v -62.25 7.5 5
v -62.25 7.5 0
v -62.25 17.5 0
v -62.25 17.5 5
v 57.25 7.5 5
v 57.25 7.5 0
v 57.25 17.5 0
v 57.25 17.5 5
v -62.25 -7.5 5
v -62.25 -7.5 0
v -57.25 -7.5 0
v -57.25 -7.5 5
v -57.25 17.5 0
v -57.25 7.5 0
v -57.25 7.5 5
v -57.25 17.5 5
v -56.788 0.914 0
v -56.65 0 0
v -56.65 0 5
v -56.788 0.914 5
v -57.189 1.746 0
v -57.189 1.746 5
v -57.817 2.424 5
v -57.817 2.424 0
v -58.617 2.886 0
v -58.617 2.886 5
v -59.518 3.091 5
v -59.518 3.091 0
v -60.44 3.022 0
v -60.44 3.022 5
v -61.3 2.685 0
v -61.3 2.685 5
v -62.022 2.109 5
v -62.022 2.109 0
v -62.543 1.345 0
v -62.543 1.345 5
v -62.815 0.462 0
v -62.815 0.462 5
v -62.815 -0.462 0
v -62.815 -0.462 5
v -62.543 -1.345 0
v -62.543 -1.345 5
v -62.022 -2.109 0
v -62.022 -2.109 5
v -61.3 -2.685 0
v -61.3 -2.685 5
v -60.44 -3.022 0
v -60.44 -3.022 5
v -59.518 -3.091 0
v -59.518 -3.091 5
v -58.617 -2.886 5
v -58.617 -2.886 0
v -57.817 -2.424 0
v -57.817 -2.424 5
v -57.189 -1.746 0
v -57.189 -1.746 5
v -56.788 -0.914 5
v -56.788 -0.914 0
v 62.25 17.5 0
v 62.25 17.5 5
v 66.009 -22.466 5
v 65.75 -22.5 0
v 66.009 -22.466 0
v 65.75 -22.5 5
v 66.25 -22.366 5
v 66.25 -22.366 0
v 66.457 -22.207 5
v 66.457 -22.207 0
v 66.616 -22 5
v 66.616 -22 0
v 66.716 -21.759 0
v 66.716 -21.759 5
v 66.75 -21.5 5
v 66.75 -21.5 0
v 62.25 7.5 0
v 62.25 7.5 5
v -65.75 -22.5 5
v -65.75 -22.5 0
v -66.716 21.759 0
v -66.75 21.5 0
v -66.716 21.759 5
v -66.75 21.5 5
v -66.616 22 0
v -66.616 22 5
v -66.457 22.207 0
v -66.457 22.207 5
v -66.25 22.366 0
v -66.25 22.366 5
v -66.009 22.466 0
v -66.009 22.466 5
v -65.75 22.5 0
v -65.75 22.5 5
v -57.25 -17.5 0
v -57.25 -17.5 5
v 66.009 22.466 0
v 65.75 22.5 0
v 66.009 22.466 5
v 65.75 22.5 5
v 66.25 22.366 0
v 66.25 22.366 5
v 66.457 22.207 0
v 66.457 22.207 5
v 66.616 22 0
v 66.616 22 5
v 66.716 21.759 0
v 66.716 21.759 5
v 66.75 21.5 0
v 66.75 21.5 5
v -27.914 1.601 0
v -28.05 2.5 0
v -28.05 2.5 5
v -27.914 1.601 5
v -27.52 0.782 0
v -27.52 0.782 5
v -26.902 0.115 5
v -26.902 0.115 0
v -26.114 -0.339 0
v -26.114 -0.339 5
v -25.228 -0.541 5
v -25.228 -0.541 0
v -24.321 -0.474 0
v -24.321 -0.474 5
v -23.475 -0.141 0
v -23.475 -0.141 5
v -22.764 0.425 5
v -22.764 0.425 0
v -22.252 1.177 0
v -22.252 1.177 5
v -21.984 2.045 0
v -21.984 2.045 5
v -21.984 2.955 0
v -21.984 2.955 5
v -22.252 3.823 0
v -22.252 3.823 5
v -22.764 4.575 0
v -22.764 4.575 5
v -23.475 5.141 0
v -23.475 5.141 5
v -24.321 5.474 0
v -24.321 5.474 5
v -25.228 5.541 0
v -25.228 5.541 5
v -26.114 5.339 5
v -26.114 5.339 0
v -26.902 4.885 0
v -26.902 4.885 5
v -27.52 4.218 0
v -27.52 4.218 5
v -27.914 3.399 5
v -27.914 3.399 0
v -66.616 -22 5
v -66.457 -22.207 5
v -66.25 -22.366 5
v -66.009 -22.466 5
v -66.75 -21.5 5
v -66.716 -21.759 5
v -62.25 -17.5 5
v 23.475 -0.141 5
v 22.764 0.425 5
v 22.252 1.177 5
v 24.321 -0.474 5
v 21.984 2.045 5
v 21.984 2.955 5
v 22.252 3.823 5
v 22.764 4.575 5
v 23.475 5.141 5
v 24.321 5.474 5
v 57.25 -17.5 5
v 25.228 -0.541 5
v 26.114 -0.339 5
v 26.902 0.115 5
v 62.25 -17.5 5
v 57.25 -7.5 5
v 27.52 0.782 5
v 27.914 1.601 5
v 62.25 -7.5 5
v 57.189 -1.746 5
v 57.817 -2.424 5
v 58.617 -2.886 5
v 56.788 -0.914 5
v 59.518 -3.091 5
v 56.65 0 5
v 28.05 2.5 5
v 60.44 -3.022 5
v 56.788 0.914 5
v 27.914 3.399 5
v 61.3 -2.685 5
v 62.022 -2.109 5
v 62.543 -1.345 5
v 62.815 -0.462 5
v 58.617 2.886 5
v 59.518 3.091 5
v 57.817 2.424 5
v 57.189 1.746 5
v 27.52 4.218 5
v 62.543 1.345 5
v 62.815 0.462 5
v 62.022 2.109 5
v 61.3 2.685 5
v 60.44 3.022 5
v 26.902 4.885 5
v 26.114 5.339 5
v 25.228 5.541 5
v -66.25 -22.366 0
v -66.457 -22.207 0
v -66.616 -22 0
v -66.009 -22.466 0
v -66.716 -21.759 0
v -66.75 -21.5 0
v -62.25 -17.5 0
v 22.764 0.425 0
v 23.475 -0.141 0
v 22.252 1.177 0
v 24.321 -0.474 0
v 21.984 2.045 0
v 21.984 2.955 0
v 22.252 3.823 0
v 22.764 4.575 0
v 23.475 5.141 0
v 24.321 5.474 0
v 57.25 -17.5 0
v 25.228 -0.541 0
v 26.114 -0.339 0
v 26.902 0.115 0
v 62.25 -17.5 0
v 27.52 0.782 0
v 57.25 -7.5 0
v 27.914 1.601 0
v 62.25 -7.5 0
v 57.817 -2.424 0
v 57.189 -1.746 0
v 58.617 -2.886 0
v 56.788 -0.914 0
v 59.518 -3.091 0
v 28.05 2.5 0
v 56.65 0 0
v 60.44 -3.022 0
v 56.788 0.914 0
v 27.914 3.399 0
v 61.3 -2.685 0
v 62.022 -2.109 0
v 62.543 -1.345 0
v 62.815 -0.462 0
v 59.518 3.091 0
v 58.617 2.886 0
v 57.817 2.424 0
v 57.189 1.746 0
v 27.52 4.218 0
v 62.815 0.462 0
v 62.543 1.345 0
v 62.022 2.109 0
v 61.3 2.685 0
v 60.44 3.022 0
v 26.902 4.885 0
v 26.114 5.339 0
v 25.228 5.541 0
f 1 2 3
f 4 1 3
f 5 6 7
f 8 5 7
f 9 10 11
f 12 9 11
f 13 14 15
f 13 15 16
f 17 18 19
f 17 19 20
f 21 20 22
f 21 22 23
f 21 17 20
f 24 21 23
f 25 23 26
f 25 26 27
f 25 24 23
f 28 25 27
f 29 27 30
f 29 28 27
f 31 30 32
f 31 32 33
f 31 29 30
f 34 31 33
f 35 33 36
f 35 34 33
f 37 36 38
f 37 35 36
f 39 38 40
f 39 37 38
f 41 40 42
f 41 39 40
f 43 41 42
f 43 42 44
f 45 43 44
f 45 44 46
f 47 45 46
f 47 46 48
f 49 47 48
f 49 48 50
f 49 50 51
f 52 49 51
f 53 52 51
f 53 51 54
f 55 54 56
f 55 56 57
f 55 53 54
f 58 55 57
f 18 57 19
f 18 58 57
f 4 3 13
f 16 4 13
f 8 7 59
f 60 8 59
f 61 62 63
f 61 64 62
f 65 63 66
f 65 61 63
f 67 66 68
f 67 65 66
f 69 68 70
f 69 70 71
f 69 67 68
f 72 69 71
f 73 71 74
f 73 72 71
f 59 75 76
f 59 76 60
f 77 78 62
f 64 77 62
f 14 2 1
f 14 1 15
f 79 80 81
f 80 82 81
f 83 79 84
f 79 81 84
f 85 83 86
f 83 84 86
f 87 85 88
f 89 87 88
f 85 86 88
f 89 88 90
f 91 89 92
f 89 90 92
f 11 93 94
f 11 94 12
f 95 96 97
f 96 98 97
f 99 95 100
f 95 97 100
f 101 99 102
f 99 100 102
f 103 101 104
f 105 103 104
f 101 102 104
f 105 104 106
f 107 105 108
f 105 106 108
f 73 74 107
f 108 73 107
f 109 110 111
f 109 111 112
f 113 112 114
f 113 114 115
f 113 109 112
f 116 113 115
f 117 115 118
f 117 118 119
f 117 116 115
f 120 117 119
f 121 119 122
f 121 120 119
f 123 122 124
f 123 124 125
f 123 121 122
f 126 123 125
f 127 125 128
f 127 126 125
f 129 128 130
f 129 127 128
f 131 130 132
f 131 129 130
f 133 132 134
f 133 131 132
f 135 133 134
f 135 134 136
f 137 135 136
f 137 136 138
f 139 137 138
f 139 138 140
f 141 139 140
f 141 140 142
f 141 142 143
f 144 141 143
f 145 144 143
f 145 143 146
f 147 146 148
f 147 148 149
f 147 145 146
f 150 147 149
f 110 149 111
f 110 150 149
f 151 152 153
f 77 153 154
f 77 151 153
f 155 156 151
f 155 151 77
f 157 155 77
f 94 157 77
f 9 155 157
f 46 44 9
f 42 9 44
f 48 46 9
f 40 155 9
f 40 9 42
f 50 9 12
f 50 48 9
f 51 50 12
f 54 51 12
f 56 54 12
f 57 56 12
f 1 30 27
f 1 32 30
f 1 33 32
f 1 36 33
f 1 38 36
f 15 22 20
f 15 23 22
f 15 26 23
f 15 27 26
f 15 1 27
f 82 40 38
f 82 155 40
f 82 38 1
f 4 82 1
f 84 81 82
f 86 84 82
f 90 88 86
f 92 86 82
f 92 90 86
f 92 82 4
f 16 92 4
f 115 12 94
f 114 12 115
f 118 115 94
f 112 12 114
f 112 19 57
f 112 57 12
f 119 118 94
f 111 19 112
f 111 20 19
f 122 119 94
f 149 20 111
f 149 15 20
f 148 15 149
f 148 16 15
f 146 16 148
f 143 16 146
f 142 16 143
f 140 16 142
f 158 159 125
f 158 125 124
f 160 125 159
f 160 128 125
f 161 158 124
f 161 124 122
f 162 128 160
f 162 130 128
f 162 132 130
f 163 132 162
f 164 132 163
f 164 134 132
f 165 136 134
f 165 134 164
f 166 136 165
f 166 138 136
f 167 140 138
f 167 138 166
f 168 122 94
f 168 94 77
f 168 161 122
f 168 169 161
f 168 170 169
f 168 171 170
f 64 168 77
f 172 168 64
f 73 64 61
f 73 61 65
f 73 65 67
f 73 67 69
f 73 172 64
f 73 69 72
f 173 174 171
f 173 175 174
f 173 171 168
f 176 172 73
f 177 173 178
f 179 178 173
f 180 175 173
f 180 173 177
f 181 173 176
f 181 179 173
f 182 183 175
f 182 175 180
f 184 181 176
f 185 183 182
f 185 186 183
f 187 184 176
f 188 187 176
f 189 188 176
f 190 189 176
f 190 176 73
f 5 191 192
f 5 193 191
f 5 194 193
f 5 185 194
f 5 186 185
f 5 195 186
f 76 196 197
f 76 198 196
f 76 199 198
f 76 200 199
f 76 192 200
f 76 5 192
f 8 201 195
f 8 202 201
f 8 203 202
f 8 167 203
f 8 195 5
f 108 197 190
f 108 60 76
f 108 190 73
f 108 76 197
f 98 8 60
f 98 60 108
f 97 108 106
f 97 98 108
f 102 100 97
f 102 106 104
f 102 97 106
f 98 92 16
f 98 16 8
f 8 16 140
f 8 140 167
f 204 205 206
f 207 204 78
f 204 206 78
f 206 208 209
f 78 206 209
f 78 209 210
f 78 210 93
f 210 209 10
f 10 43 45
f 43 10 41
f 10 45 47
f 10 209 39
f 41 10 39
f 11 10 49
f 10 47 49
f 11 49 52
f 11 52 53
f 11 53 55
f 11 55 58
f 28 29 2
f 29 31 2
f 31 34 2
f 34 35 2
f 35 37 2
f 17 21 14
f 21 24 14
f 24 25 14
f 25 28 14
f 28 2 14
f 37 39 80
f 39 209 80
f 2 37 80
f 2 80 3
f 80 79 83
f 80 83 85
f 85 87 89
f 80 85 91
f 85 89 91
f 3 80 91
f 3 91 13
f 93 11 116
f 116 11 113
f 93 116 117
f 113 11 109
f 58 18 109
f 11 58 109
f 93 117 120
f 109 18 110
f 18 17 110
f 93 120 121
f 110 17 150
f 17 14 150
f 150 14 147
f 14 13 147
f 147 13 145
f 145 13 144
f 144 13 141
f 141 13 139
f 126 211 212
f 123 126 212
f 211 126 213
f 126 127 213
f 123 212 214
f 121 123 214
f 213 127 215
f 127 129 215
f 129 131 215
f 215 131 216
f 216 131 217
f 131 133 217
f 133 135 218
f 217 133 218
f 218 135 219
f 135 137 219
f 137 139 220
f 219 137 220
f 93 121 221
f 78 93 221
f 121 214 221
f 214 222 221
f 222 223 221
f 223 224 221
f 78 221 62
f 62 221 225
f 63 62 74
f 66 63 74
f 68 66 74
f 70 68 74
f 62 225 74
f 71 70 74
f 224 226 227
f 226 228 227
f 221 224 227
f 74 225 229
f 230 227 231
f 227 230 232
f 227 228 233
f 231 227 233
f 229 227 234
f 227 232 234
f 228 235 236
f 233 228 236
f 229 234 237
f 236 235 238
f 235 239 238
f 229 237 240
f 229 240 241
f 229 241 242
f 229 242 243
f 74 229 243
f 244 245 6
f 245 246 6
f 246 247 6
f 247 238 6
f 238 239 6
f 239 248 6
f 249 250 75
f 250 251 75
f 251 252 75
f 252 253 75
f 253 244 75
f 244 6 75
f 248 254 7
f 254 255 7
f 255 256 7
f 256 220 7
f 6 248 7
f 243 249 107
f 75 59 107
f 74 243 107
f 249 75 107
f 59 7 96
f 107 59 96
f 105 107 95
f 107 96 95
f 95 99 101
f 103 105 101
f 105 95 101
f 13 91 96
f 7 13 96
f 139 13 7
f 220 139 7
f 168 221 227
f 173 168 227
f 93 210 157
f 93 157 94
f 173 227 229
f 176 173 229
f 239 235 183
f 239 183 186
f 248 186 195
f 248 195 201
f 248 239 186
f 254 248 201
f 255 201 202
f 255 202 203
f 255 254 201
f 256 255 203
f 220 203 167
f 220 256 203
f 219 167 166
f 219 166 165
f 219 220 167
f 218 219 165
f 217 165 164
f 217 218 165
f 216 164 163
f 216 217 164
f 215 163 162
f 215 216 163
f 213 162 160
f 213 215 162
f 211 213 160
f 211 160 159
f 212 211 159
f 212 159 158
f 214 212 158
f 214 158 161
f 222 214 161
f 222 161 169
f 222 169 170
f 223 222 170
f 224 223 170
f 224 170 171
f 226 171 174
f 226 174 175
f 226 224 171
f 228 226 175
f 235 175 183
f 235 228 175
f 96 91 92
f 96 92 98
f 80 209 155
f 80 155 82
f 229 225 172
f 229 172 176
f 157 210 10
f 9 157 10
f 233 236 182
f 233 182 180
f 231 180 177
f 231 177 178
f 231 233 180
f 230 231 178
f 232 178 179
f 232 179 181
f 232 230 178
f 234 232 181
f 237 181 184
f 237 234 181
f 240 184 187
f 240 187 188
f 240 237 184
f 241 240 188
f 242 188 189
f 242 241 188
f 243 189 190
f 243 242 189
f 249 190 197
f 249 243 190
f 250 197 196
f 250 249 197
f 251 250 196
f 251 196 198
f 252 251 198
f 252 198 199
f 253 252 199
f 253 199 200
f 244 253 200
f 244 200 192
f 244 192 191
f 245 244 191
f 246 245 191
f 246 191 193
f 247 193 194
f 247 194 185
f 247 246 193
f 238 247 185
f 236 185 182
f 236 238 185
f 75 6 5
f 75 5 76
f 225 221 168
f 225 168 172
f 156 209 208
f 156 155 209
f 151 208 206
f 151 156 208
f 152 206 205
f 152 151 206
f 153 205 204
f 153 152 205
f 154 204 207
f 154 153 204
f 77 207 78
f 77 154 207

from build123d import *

# Parameters (mm, degrees)
SKETCH1_W           = 133.5
SKETCH1_H           = 45
SKETCH1_R           = 3.05
SKETCH1_R_2         = 3.1
SKETCH1_W_2         = 5
SKETCH1_H_2         = 10
BOSS_EXTRUDE1_DEPTH = 5
FILLET1_R           = 1


with BuildPart() as part:
    # Sketch1 → Boss-Extrude1 (new body)
    with BuildSketch(Plane.XY):
        Rectangle(SKETCH1_W, SKETCH1_H)
        with Locations((25, 2.5)):
            Circle(SKETCH1_R, mode=Mode.SUBTRACT)
        with Locations(Location((-25, 2.5, 0), (0, 0, 180))):
            Circle(SKETCH1_R, mode=Mode.SUBTRACT)
        with Locations((-59.75, 0)):
            Circle(SKETCH1_R_2, mode=Mode.SUBTRACT)
        with Locations(Location((59.75, 0, 0), (0, 0, 180))):
            Circle(SKETCH1_R_2, mode=Mode.SUBTRACT)
        with Locations((-59.75, -12.5)):
            Rectangle(SKETCH1_W_2, SKETCH1_H_2, mode=Mode.SUBTRACT)
        with Locations((59.75, -12.5)):
            Rectangle(SKETCH1_W_2, SKETCH1_H_2, mode=Mode.SUBTRACT)
        with Locations((-59.75, 12.5)):
            Rectangle(SKETCH1_W_2, SKETCH1_H_2, mode=Mode.SUBTRACT)
        with Locations((59.75, 12.5)):
            Rectangle(SKETCH1_W_2, SKETCH1_H_2, mode=Mode.SUBTRACT)
    extrude(amount=BOSS_EXTRUDE1_DEPTH)

    # Fillet1
    fillet1_edges = [part.edges().sort_by_distance(p)[0] for p in [
        (66.75, -22.5, 2.5),
        (-66.75, -22.5, 2.5),
        (-66.75, 22.5, 2.5),
        (66.75, 22.5, 2.5),
    ]]
    fillet(fillet1_edges, radius=FILLET1_R)


solid = part.part
